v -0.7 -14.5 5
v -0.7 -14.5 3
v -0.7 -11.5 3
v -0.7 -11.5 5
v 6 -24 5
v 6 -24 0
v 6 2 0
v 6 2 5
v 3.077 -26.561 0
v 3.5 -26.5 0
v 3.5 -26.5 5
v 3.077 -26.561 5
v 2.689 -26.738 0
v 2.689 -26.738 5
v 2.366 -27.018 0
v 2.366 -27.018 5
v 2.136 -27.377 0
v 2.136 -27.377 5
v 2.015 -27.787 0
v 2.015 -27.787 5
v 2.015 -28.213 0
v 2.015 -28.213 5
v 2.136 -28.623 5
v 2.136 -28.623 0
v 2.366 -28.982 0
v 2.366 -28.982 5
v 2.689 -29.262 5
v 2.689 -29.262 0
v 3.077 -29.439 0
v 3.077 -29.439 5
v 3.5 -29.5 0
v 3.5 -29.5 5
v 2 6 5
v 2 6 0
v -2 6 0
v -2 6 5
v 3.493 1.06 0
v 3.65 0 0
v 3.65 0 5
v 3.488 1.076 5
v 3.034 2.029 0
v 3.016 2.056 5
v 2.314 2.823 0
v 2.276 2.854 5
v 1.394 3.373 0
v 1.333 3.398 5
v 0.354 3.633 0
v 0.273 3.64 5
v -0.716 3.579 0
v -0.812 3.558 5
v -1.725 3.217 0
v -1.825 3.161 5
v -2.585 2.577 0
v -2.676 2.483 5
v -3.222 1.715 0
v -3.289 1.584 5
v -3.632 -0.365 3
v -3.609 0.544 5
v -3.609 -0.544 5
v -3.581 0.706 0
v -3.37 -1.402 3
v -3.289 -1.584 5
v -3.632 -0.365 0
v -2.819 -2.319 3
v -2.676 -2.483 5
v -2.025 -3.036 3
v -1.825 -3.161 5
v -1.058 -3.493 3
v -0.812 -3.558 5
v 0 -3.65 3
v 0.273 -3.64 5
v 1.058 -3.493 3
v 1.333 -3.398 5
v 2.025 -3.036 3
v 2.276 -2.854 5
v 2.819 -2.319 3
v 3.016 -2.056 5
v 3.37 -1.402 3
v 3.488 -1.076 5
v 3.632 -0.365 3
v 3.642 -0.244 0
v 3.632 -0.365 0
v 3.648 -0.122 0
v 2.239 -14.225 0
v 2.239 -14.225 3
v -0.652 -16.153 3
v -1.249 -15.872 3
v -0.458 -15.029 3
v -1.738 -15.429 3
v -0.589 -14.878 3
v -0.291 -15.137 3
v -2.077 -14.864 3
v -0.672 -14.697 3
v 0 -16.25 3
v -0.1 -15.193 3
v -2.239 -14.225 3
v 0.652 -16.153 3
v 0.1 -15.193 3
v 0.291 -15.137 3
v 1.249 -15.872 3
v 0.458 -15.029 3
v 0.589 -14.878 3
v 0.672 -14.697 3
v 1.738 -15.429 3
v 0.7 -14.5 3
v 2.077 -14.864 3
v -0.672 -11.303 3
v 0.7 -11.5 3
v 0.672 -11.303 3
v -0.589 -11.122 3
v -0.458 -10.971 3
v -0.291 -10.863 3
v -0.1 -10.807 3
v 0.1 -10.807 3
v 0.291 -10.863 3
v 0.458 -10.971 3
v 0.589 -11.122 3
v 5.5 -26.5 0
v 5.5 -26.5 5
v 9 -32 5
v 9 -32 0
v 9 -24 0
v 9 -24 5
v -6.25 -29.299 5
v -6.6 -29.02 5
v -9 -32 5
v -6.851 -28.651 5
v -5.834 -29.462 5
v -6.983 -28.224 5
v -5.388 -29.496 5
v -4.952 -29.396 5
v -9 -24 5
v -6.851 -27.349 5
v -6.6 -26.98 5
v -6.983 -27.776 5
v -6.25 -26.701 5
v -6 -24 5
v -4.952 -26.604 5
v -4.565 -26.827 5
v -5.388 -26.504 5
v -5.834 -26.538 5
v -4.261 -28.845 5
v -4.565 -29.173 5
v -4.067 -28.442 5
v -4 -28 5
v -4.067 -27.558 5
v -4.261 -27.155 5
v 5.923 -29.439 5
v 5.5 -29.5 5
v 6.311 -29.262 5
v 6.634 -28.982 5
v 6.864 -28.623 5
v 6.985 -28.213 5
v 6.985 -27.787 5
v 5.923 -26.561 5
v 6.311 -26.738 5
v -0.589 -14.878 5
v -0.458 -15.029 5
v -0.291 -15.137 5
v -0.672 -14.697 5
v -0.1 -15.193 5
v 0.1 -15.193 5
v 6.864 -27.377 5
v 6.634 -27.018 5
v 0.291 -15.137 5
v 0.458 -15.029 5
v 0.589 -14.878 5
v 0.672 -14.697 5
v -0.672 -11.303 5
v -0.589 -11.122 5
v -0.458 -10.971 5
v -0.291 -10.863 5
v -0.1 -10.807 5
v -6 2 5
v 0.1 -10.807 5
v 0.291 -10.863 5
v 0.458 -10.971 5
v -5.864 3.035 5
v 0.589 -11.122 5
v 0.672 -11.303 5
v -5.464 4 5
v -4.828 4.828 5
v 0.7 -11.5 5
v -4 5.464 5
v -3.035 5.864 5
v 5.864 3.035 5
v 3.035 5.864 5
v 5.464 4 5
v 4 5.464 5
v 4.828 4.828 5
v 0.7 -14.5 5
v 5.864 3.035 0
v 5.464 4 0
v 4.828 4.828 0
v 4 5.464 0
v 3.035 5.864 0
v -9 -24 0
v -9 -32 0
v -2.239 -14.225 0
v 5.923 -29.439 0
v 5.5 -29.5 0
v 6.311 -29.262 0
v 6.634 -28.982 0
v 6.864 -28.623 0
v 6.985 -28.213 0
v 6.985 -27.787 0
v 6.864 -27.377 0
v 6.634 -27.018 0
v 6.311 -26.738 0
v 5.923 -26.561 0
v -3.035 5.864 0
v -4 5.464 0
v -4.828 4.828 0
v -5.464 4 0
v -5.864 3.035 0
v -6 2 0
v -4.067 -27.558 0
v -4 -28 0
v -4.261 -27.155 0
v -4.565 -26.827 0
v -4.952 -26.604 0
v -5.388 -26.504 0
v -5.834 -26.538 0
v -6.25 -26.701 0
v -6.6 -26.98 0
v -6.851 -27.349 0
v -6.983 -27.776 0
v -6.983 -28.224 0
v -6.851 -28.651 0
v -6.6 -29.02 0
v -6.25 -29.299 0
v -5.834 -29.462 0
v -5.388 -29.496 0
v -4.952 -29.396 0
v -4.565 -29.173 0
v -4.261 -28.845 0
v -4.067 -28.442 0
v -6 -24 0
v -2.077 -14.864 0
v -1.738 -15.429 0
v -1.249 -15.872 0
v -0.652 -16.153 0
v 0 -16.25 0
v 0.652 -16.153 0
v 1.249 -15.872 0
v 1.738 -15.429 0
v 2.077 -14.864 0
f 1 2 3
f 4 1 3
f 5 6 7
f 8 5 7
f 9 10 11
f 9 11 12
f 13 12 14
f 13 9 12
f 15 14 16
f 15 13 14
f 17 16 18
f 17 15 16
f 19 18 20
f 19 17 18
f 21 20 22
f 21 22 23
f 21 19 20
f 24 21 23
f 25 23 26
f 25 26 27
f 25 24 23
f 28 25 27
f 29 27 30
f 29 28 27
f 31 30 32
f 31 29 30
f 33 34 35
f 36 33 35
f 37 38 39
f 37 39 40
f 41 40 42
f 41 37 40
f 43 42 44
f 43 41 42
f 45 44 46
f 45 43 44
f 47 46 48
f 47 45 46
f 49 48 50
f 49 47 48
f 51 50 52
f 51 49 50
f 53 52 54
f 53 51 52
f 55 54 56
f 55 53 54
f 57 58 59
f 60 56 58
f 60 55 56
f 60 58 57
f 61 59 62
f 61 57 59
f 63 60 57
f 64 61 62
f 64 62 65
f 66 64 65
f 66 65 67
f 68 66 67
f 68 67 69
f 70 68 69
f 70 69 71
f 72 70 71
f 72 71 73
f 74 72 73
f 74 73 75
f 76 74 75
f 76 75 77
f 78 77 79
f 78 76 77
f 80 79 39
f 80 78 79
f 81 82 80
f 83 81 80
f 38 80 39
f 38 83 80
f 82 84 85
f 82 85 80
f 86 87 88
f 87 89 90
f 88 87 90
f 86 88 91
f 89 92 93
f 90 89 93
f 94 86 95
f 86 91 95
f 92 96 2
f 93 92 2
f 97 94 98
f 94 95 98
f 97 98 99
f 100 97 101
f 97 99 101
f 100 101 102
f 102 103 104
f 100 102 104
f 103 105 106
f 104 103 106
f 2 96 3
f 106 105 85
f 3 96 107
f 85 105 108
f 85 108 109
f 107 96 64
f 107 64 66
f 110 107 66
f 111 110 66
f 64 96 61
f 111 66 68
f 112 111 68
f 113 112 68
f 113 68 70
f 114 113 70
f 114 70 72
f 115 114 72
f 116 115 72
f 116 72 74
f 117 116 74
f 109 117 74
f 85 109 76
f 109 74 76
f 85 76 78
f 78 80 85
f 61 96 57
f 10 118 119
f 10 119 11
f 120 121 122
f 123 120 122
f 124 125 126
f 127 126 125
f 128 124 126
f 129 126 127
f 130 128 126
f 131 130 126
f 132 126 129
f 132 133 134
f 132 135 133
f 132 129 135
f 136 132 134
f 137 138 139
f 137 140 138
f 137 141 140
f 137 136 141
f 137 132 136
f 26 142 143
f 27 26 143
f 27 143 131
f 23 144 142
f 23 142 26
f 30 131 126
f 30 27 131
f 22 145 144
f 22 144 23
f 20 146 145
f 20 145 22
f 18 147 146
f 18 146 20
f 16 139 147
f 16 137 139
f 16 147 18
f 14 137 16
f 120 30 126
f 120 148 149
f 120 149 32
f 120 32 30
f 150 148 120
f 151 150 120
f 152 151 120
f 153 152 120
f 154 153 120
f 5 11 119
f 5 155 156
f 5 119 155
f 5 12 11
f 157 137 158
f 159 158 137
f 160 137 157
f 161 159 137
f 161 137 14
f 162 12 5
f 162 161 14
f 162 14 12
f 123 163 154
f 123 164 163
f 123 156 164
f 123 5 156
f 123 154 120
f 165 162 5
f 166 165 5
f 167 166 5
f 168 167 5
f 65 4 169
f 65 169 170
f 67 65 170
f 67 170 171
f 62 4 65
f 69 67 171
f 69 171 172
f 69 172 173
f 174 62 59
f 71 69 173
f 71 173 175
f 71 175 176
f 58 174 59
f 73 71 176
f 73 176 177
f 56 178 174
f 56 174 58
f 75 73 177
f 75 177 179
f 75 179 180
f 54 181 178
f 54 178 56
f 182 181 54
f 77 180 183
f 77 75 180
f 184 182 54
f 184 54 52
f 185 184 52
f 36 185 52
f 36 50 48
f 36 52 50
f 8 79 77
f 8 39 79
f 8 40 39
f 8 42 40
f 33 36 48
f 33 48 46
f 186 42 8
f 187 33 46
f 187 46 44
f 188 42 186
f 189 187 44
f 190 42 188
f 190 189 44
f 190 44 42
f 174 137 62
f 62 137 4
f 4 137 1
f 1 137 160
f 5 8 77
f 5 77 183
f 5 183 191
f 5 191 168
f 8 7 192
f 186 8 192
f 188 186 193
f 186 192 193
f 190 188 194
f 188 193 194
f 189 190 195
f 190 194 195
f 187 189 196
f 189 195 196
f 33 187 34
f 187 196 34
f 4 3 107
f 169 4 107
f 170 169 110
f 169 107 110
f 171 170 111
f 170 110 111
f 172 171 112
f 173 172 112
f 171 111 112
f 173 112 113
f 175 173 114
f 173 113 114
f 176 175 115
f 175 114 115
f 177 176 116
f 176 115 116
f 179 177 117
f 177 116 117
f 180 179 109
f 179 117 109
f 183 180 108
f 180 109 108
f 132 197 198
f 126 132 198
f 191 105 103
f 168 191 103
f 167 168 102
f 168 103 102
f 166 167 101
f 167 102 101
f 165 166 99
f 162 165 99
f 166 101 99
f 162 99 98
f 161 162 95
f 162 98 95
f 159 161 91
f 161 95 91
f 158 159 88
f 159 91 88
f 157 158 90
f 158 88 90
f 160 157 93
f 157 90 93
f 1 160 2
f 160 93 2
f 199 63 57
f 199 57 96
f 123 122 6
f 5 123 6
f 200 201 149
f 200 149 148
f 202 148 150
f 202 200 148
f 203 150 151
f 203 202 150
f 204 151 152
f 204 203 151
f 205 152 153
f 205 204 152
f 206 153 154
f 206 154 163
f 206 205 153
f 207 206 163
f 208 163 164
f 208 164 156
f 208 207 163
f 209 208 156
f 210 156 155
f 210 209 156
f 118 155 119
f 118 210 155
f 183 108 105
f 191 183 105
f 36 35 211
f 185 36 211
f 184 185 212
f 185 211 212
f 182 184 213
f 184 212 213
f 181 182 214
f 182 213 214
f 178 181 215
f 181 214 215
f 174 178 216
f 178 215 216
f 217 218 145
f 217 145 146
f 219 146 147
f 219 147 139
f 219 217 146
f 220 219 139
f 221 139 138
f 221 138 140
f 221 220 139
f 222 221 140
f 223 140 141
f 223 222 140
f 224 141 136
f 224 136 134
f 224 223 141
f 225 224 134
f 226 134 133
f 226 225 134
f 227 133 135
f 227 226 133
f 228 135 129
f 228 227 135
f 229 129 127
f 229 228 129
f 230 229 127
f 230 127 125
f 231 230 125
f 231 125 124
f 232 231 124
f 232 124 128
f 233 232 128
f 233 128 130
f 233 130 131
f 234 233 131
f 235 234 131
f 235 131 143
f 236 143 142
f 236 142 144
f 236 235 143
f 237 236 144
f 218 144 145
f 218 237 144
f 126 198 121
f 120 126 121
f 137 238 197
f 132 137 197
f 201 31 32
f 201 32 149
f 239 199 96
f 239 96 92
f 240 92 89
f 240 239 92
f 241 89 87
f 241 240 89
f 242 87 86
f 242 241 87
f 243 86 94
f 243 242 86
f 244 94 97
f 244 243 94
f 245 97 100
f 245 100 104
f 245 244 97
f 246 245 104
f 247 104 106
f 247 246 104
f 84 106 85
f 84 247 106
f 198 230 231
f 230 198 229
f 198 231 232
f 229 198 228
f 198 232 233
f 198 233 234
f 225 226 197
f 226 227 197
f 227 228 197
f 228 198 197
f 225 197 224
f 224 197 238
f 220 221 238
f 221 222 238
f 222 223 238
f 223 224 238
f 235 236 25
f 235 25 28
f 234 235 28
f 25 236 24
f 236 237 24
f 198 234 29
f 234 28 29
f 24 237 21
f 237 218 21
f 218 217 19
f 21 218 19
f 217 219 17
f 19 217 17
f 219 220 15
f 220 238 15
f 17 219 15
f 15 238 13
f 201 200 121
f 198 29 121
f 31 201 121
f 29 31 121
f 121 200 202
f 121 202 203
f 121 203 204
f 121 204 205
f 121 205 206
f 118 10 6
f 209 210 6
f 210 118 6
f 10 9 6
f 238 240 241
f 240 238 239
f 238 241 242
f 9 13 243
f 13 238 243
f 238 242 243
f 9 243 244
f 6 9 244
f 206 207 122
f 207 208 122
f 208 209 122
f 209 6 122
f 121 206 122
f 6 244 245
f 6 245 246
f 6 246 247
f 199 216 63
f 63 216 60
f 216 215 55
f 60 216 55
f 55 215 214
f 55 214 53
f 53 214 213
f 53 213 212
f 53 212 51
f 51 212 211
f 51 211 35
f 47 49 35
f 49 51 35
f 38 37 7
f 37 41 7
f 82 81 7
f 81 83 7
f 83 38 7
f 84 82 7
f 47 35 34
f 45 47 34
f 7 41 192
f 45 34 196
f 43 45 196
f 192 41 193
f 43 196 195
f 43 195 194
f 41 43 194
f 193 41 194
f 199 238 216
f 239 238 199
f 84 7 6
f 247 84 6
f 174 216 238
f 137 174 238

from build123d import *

# Parameters (mm, degrees)
ESBO_O1_R                = 1.5
ESBO_O1_R_2              = 3.65
RESSALTO_EXTRUS_O1_DEPTH = 5
CORTE_EXTRUS_O1_DEPTH    = 3


with BuildPart() as part:
    # Esboço1 → Ressalto-extrusão1 (new body)
    with BuildSketch(Plane.XY):
        with BuildLine():
            ThreePointArc((-2, 6), (-4.828427125, 4.828427125), (-6, 2))
            Line((-6, 2), (-6, -24))
            Line((-6, -24), (-9, -24))
            Line((-9, -24), (-9, -32))
            Line((-9, -32), (9, -32))
            Line((9, -32), (9, -24))
            Line((9, -24), (6, -24))
            Line((6, -24), (6, 2))
            ThreePointArc((6, 2), (4.828427125, 4.828427125), (2, 6))
            Line((2, 6), (-2, 6))
        make_face()
        with Locations((-5.5, -28)):
            Circle(ESBO_O1_R, mode=Mode.SUBTRACT)
        with BuildLine():
            Line((3.5, -26.5), (5.5, -26.5))
            ThreePointArc((5.5, -26.5), (7, -28), (5.5, -29.5))
            Line((5.5, -29.5), (3.5, -29.5))
            ThreePointArc((3.5, -29.5), (2, -28), (3.5, -26.5))
        make_face(mode=Mode.SUBTRACT)
        Circle(ESBO_O1_R_2, mode=Mode.SUBTRACT)
        with BuildLine():
            Line((0.7, -11.5), (0.7, -14.5))
            ThreePointArc((0.7, -14.5), (0, -15.2), (-0.7, -14.5))
            Line((-0.7, -14.5), (-0.7, -11.5))
            ThreePointArc((-0.7, -11.5), (0, -10.8), (0.7, -11.5))
        make_face(mode=Mode.SUBTRACT)
    extrude(amount=RESSALTO_EXTRUS_O1_DEPTH)

    # Esboço1<3> → Corte-extrusão1 (cut)
    with BuildSketch(Plane.XY):
        with BuildLine():
            ThreePointArc((-2.238721733, -14.225), (0, -16.25), (2.238721733, -14.225))
            Line((2.238721733, -14.225), (3.631704145, -0.365))
            ThreePointArc((3.631704145, -0.365), (0, -3.65), (-3.631704145, -0.365))
            Line((-3.631704145, -0.365), (-2.238721733, -14.225))
        make_face()
        with BuildLine():
            ThreePointArc((0.7, -14.5), (0, -15.2), (-0.7, -14.5))
            Line((-0.7, -14.5), (-0.7, -11.5))
            ThreePointArc((-0.7, -11.5), (0, -10.8), (0.7, -11.5))
            Line((0.7, -11.5), (0.7, -14.5))
        make_face(mode=Mode.SUBTRACT)
    extrude(amount=CORTE_EXTRUS_O1_DEPTH, mode=Mode.SUBTRACT)


solid = part.part
